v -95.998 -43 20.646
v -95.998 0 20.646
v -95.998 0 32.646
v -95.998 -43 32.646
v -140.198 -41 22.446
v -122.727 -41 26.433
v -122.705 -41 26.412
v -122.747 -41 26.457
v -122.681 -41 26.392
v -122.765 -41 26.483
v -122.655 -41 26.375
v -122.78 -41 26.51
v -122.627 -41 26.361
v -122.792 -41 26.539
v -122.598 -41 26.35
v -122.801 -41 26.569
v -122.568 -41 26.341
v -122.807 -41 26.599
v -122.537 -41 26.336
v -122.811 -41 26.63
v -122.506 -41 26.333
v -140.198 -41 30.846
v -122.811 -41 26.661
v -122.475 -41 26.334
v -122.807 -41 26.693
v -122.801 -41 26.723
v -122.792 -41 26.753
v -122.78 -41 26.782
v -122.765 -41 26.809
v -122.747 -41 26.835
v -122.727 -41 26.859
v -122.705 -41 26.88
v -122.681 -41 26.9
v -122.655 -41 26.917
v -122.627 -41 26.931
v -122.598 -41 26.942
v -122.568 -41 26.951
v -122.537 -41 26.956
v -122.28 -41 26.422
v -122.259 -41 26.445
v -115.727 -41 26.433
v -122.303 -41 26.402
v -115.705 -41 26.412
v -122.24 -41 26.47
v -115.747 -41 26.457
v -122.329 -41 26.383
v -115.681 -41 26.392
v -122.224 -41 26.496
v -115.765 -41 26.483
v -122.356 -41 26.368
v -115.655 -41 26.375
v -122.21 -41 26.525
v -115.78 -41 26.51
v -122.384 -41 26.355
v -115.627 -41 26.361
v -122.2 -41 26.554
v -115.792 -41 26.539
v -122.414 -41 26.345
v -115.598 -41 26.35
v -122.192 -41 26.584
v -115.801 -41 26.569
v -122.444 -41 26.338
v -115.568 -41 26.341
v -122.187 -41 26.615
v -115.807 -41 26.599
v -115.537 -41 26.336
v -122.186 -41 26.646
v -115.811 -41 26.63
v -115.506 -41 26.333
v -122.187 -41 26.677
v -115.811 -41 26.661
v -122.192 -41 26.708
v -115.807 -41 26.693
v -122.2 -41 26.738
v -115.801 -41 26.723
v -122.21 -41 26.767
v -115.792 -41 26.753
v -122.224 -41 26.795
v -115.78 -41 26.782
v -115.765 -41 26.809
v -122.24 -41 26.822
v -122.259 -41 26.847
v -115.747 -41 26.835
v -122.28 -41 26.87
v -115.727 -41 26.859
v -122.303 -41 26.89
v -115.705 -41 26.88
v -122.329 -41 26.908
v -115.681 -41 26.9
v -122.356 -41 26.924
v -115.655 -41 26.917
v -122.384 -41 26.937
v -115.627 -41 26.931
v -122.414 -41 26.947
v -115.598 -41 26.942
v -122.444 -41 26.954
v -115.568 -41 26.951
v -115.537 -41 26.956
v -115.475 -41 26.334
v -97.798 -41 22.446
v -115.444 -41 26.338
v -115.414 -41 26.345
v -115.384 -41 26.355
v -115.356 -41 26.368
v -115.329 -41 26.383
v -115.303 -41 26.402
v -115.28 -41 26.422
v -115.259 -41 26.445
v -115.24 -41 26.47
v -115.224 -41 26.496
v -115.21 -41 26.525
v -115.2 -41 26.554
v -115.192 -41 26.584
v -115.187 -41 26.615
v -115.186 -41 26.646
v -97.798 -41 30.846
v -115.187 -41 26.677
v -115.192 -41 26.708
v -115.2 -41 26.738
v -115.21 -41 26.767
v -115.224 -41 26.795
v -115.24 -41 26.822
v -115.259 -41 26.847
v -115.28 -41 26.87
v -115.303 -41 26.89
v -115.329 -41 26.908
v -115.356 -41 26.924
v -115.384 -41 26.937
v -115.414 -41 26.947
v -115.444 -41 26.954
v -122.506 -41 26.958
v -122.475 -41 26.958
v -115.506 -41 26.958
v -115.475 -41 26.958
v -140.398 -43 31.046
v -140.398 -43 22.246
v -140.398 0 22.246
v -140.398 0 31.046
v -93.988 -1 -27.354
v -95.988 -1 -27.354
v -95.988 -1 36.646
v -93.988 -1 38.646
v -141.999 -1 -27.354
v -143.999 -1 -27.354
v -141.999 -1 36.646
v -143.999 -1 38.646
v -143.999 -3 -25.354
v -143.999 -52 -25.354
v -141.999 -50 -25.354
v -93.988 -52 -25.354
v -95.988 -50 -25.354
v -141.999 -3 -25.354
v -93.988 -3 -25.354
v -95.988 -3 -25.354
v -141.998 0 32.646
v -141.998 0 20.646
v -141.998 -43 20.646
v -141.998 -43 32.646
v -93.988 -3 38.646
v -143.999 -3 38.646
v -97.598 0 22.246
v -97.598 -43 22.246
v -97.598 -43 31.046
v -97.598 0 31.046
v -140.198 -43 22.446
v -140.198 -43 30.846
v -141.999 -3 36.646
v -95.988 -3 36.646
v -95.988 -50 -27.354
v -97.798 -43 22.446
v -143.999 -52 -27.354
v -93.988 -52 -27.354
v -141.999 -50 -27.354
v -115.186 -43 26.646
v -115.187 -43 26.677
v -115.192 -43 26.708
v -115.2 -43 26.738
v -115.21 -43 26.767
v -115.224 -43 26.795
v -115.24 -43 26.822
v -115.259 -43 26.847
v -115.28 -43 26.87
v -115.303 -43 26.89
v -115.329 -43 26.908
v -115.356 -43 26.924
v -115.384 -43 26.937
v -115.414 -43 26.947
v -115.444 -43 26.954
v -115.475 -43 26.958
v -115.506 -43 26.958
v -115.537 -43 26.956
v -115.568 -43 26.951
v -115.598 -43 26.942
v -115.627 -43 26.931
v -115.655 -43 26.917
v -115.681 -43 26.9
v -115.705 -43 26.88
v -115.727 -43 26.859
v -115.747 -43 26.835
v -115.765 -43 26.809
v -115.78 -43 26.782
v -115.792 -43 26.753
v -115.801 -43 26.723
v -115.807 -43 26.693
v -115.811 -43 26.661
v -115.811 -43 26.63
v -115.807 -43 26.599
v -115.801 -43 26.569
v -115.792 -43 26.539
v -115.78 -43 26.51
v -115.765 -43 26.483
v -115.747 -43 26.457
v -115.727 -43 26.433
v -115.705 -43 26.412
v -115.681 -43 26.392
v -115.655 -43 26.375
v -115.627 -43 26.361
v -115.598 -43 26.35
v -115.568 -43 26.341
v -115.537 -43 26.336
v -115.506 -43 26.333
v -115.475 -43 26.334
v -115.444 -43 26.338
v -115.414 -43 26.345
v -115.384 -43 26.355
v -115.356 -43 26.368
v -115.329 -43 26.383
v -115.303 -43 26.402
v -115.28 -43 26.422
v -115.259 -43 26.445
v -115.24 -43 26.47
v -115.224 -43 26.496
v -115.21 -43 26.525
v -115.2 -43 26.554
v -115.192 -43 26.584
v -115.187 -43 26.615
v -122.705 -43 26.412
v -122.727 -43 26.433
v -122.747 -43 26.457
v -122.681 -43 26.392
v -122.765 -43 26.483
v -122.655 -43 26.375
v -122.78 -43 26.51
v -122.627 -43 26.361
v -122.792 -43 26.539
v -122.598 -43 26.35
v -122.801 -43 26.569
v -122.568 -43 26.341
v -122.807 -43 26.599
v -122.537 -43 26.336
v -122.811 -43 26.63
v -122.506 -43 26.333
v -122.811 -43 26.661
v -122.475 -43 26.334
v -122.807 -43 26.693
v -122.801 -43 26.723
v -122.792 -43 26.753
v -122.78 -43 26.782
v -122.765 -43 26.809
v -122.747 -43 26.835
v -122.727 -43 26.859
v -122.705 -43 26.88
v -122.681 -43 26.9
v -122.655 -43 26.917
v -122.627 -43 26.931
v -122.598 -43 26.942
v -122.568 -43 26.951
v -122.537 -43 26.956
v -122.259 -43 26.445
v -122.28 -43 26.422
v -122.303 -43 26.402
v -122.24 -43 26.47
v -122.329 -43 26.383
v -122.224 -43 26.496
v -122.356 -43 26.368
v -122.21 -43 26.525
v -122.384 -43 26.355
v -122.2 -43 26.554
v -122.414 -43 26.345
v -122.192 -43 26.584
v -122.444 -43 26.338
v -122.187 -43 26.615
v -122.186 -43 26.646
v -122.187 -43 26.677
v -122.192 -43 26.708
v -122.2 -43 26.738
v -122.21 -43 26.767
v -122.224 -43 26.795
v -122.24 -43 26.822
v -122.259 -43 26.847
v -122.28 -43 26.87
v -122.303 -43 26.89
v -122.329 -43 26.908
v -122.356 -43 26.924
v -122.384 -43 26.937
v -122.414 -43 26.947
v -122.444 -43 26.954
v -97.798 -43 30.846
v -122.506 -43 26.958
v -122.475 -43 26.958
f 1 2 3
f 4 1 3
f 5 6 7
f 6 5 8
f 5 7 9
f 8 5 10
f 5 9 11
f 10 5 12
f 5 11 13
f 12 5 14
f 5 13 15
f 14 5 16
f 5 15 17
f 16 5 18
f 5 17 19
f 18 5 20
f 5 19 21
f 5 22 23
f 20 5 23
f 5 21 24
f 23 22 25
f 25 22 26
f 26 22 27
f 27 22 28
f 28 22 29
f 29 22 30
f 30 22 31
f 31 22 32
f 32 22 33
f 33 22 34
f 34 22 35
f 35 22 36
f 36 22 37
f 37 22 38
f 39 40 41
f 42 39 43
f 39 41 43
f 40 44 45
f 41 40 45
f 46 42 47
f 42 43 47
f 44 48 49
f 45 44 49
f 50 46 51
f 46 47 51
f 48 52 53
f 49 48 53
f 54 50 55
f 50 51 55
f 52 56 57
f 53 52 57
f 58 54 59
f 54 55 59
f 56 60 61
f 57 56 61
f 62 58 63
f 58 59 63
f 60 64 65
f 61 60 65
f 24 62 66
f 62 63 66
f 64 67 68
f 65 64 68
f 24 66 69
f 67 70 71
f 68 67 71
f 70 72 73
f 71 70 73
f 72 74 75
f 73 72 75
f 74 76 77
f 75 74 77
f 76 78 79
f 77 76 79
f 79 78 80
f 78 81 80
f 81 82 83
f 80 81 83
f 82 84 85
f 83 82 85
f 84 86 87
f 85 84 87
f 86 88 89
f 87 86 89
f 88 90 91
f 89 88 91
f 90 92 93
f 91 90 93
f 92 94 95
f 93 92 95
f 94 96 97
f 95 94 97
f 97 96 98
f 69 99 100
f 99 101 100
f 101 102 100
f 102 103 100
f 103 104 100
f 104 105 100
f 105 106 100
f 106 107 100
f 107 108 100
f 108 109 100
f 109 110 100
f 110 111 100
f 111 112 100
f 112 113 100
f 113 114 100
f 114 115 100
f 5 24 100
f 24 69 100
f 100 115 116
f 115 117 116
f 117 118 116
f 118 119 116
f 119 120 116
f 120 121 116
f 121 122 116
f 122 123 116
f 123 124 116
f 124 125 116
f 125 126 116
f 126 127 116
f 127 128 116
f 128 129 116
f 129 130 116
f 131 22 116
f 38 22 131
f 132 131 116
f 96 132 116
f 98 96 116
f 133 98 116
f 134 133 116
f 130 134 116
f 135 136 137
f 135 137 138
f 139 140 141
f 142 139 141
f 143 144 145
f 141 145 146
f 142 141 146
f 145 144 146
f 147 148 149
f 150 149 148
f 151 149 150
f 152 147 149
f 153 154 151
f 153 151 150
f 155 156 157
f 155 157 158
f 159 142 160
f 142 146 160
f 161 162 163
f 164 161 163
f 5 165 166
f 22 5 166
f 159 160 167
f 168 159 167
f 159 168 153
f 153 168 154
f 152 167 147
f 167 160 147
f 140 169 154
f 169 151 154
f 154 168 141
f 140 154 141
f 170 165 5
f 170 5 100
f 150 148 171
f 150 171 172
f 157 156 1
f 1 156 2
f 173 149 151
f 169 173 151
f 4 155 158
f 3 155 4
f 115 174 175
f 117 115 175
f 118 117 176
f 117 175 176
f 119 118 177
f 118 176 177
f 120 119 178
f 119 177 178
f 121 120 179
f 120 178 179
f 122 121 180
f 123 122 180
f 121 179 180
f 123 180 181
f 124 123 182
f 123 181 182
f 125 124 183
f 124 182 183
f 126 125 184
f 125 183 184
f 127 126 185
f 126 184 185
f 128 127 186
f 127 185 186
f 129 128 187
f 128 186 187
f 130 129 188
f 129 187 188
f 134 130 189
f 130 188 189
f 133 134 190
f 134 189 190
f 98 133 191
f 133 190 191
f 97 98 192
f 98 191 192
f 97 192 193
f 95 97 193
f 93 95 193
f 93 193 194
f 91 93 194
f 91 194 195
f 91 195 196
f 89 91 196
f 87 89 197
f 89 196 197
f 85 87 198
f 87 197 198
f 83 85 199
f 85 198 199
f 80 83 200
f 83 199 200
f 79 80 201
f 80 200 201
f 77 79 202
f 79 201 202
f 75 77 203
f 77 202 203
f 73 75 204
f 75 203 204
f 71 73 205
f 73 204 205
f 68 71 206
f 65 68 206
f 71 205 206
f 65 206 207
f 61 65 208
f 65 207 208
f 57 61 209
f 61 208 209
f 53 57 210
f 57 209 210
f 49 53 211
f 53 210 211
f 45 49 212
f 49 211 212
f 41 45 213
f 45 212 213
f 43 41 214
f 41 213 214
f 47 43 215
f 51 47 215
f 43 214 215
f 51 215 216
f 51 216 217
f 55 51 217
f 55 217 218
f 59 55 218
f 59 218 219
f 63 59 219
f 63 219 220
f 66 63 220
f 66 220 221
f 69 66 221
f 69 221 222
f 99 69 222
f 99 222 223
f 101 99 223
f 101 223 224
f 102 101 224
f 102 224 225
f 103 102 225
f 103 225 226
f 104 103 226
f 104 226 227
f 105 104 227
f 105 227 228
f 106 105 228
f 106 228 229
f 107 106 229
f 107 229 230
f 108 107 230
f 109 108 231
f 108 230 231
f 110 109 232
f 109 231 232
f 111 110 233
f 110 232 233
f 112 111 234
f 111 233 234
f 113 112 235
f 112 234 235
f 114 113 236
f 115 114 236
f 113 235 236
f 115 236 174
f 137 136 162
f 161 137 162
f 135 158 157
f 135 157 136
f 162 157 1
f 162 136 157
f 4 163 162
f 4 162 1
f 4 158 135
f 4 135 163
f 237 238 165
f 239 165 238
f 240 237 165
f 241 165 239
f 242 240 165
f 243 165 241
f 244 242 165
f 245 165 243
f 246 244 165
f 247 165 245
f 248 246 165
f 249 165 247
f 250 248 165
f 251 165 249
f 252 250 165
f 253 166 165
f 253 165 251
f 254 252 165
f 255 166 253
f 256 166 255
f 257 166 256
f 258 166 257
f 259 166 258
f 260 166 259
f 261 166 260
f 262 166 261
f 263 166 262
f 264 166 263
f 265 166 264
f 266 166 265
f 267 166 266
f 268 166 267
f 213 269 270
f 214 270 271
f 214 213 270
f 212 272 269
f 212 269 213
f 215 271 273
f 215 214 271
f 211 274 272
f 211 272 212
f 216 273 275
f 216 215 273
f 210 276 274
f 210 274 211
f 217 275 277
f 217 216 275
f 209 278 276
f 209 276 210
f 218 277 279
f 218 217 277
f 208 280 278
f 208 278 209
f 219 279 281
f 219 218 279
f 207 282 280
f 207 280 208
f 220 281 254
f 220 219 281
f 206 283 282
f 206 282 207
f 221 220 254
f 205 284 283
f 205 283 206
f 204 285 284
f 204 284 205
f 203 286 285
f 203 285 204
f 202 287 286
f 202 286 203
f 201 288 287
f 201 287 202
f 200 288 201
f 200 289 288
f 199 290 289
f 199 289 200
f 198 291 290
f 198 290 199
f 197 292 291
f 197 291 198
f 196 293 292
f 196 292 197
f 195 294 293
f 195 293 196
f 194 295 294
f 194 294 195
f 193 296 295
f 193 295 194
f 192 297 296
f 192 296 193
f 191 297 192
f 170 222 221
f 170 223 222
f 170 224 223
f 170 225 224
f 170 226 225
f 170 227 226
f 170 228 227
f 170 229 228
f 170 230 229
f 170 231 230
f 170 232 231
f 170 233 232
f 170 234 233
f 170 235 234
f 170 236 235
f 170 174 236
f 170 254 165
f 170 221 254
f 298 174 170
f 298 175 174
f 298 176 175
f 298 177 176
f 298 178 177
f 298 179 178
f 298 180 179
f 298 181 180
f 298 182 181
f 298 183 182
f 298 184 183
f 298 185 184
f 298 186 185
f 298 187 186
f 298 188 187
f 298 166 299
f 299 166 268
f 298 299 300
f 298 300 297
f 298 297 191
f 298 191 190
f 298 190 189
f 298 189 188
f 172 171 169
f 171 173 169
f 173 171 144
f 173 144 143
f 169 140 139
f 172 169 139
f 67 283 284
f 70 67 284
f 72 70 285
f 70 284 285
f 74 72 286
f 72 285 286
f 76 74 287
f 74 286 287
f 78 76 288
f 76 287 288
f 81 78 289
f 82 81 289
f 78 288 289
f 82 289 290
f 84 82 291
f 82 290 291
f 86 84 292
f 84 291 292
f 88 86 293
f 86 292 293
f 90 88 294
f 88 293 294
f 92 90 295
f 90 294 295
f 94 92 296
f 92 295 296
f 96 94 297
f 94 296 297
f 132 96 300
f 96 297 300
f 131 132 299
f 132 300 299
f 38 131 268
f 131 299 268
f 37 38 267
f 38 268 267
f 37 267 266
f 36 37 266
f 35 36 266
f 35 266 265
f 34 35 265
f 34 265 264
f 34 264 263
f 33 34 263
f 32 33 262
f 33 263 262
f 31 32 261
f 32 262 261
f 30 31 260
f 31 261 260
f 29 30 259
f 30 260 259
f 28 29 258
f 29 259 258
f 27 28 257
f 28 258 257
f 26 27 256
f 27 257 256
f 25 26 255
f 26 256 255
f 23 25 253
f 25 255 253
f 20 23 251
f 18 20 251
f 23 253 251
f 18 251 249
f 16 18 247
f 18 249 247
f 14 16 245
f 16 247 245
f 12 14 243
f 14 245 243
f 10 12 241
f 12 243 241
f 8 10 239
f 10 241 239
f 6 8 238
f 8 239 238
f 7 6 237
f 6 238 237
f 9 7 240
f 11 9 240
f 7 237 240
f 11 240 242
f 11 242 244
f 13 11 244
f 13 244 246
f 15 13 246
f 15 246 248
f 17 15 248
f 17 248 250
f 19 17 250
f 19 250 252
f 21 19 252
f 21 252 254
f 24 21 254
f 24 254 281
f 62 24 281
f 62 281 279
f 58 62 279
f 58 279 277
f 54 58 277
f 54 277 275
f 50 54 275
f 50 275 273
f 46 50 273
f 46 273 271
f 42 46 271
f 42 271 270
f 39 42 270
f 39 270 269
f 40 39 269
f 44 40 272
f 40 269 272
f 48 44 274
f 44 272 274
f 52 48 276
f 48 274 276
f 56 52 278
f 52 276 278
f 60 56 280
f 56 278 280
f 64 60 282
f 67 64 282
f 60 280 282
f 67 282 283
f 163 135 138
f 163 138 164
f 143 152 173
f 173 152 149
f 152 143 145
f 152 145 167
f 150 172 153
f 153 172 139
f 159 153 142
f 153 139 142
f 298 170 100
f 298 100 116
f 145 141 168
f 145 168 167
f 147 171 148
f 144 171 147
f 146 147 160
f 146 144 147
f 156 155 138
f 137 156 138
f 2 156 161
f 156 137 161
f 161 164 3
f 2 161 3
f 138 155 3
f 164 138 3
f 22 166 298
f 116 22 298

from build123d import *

# Parameters (mm, degrees)
F0_W      = 46
F0_H      = 12
F0_W_2    = 42.8
F0_H_2    = 8.8
F1_DEPTH  = 43
F3_W      = 42.4
F3_H      = 8.4
F3_R      = 0.3125671549
F4_DEPTH  = 2
F8_DEPTH  = 2
F10_DEPTH = 2
F11_W     = 50.011
F11_H     = 2
F12_DEPTH = 2
F13_W     = 50.011
F13_H     = 2
F14_DEPTH = 2


with BuildPart() as f1:
    # F0 (on Front) → F1 (new body)
    with BuildSketch(Plane.XZ):
        with Locations((-118.9983392358, 26.6459157018)):
            Rectangle(F0_W, F0_H)
        with Locations((-118.9983392358, 26.6459157018)):
            Rectangle(F0_W_2, F0_H_2, mode=Mode.SUBTRACT)
    extrude(amount=F1_DEPTH)


with BuildPart() as f4:
    # F3 (on face) → F4 (new body)
    with BuildSketch(Plane.XZ.offset(43)):
        with Locations((-118.9983392358, 26.6459157018)):
            Rectangle(F3_W, F3_H)
        with Locations((-122.4983392358, 26.6459157018)):
            Circle(F3_R, mode=Mode.SUBTRACT)
        with Locations((-115.4983392358, 26.6459157018)):
            Circle(F3_R, mode=Mode.SUBTRACT)
    extrude(amount=-F4_DEPTH)


with BuildPart() as f8:
    # F7 (on offset) → F8 (new body)
    with BuildSketch(Plane.YZ.offset(-95.9883392358)):
        Polygon((-1, -27.3540842982), (-1, 38.6459157018), (-3, 38.6459157018), (-3, -25.3540842982), (-50, -25.3540842982), (-50, -27.3540842982), align=None)
    extrude(amount=F8_DEPTH)



with BuildPart() as f10:
    # F9 (on offset) → F10 (new body)
    with BuildSketch(Plane(origin=(-141.9993392358, 0, 0), x_dir=(0, -1, 0), z_dir=(-1, 0, 0))):
        Polygon((3, 38.6459157018), (1, 38.6459157018), (1, -27.3540842982), (50, -27.3540842982), (50, -25.3540842982), (3, -25.3540842982), align=None)
    extrude(amount=F10_DEPTH)


with BuildPart() as f8_1:
    add(f8.part)

    add(f10.part)  # F12 merges F10
    # F11 (on face) → F12 (join)
    with BuildSketch(Plane(origin=(0, -1, 0), x_dir=(-1, 0, 0), z_dir=(0, 1, 0))):
        with Locations((118.9938392358, 37.6459157018)):
            Rectangle(F11_W, F11_H)
    extrude(amount=-F12_DEPTH)

    # F13 (on face) → F14 (join)
    with BuildSketch(Plane.XZ.offset(50)):
        with Locations((-118.9938392358, -26.3540842982)):
            Rectangle(F13_W, F13_H)
    extrude(amount=F14_DEPTH)


solid = Compound([f1.part, f4.part, f8_1.part])
